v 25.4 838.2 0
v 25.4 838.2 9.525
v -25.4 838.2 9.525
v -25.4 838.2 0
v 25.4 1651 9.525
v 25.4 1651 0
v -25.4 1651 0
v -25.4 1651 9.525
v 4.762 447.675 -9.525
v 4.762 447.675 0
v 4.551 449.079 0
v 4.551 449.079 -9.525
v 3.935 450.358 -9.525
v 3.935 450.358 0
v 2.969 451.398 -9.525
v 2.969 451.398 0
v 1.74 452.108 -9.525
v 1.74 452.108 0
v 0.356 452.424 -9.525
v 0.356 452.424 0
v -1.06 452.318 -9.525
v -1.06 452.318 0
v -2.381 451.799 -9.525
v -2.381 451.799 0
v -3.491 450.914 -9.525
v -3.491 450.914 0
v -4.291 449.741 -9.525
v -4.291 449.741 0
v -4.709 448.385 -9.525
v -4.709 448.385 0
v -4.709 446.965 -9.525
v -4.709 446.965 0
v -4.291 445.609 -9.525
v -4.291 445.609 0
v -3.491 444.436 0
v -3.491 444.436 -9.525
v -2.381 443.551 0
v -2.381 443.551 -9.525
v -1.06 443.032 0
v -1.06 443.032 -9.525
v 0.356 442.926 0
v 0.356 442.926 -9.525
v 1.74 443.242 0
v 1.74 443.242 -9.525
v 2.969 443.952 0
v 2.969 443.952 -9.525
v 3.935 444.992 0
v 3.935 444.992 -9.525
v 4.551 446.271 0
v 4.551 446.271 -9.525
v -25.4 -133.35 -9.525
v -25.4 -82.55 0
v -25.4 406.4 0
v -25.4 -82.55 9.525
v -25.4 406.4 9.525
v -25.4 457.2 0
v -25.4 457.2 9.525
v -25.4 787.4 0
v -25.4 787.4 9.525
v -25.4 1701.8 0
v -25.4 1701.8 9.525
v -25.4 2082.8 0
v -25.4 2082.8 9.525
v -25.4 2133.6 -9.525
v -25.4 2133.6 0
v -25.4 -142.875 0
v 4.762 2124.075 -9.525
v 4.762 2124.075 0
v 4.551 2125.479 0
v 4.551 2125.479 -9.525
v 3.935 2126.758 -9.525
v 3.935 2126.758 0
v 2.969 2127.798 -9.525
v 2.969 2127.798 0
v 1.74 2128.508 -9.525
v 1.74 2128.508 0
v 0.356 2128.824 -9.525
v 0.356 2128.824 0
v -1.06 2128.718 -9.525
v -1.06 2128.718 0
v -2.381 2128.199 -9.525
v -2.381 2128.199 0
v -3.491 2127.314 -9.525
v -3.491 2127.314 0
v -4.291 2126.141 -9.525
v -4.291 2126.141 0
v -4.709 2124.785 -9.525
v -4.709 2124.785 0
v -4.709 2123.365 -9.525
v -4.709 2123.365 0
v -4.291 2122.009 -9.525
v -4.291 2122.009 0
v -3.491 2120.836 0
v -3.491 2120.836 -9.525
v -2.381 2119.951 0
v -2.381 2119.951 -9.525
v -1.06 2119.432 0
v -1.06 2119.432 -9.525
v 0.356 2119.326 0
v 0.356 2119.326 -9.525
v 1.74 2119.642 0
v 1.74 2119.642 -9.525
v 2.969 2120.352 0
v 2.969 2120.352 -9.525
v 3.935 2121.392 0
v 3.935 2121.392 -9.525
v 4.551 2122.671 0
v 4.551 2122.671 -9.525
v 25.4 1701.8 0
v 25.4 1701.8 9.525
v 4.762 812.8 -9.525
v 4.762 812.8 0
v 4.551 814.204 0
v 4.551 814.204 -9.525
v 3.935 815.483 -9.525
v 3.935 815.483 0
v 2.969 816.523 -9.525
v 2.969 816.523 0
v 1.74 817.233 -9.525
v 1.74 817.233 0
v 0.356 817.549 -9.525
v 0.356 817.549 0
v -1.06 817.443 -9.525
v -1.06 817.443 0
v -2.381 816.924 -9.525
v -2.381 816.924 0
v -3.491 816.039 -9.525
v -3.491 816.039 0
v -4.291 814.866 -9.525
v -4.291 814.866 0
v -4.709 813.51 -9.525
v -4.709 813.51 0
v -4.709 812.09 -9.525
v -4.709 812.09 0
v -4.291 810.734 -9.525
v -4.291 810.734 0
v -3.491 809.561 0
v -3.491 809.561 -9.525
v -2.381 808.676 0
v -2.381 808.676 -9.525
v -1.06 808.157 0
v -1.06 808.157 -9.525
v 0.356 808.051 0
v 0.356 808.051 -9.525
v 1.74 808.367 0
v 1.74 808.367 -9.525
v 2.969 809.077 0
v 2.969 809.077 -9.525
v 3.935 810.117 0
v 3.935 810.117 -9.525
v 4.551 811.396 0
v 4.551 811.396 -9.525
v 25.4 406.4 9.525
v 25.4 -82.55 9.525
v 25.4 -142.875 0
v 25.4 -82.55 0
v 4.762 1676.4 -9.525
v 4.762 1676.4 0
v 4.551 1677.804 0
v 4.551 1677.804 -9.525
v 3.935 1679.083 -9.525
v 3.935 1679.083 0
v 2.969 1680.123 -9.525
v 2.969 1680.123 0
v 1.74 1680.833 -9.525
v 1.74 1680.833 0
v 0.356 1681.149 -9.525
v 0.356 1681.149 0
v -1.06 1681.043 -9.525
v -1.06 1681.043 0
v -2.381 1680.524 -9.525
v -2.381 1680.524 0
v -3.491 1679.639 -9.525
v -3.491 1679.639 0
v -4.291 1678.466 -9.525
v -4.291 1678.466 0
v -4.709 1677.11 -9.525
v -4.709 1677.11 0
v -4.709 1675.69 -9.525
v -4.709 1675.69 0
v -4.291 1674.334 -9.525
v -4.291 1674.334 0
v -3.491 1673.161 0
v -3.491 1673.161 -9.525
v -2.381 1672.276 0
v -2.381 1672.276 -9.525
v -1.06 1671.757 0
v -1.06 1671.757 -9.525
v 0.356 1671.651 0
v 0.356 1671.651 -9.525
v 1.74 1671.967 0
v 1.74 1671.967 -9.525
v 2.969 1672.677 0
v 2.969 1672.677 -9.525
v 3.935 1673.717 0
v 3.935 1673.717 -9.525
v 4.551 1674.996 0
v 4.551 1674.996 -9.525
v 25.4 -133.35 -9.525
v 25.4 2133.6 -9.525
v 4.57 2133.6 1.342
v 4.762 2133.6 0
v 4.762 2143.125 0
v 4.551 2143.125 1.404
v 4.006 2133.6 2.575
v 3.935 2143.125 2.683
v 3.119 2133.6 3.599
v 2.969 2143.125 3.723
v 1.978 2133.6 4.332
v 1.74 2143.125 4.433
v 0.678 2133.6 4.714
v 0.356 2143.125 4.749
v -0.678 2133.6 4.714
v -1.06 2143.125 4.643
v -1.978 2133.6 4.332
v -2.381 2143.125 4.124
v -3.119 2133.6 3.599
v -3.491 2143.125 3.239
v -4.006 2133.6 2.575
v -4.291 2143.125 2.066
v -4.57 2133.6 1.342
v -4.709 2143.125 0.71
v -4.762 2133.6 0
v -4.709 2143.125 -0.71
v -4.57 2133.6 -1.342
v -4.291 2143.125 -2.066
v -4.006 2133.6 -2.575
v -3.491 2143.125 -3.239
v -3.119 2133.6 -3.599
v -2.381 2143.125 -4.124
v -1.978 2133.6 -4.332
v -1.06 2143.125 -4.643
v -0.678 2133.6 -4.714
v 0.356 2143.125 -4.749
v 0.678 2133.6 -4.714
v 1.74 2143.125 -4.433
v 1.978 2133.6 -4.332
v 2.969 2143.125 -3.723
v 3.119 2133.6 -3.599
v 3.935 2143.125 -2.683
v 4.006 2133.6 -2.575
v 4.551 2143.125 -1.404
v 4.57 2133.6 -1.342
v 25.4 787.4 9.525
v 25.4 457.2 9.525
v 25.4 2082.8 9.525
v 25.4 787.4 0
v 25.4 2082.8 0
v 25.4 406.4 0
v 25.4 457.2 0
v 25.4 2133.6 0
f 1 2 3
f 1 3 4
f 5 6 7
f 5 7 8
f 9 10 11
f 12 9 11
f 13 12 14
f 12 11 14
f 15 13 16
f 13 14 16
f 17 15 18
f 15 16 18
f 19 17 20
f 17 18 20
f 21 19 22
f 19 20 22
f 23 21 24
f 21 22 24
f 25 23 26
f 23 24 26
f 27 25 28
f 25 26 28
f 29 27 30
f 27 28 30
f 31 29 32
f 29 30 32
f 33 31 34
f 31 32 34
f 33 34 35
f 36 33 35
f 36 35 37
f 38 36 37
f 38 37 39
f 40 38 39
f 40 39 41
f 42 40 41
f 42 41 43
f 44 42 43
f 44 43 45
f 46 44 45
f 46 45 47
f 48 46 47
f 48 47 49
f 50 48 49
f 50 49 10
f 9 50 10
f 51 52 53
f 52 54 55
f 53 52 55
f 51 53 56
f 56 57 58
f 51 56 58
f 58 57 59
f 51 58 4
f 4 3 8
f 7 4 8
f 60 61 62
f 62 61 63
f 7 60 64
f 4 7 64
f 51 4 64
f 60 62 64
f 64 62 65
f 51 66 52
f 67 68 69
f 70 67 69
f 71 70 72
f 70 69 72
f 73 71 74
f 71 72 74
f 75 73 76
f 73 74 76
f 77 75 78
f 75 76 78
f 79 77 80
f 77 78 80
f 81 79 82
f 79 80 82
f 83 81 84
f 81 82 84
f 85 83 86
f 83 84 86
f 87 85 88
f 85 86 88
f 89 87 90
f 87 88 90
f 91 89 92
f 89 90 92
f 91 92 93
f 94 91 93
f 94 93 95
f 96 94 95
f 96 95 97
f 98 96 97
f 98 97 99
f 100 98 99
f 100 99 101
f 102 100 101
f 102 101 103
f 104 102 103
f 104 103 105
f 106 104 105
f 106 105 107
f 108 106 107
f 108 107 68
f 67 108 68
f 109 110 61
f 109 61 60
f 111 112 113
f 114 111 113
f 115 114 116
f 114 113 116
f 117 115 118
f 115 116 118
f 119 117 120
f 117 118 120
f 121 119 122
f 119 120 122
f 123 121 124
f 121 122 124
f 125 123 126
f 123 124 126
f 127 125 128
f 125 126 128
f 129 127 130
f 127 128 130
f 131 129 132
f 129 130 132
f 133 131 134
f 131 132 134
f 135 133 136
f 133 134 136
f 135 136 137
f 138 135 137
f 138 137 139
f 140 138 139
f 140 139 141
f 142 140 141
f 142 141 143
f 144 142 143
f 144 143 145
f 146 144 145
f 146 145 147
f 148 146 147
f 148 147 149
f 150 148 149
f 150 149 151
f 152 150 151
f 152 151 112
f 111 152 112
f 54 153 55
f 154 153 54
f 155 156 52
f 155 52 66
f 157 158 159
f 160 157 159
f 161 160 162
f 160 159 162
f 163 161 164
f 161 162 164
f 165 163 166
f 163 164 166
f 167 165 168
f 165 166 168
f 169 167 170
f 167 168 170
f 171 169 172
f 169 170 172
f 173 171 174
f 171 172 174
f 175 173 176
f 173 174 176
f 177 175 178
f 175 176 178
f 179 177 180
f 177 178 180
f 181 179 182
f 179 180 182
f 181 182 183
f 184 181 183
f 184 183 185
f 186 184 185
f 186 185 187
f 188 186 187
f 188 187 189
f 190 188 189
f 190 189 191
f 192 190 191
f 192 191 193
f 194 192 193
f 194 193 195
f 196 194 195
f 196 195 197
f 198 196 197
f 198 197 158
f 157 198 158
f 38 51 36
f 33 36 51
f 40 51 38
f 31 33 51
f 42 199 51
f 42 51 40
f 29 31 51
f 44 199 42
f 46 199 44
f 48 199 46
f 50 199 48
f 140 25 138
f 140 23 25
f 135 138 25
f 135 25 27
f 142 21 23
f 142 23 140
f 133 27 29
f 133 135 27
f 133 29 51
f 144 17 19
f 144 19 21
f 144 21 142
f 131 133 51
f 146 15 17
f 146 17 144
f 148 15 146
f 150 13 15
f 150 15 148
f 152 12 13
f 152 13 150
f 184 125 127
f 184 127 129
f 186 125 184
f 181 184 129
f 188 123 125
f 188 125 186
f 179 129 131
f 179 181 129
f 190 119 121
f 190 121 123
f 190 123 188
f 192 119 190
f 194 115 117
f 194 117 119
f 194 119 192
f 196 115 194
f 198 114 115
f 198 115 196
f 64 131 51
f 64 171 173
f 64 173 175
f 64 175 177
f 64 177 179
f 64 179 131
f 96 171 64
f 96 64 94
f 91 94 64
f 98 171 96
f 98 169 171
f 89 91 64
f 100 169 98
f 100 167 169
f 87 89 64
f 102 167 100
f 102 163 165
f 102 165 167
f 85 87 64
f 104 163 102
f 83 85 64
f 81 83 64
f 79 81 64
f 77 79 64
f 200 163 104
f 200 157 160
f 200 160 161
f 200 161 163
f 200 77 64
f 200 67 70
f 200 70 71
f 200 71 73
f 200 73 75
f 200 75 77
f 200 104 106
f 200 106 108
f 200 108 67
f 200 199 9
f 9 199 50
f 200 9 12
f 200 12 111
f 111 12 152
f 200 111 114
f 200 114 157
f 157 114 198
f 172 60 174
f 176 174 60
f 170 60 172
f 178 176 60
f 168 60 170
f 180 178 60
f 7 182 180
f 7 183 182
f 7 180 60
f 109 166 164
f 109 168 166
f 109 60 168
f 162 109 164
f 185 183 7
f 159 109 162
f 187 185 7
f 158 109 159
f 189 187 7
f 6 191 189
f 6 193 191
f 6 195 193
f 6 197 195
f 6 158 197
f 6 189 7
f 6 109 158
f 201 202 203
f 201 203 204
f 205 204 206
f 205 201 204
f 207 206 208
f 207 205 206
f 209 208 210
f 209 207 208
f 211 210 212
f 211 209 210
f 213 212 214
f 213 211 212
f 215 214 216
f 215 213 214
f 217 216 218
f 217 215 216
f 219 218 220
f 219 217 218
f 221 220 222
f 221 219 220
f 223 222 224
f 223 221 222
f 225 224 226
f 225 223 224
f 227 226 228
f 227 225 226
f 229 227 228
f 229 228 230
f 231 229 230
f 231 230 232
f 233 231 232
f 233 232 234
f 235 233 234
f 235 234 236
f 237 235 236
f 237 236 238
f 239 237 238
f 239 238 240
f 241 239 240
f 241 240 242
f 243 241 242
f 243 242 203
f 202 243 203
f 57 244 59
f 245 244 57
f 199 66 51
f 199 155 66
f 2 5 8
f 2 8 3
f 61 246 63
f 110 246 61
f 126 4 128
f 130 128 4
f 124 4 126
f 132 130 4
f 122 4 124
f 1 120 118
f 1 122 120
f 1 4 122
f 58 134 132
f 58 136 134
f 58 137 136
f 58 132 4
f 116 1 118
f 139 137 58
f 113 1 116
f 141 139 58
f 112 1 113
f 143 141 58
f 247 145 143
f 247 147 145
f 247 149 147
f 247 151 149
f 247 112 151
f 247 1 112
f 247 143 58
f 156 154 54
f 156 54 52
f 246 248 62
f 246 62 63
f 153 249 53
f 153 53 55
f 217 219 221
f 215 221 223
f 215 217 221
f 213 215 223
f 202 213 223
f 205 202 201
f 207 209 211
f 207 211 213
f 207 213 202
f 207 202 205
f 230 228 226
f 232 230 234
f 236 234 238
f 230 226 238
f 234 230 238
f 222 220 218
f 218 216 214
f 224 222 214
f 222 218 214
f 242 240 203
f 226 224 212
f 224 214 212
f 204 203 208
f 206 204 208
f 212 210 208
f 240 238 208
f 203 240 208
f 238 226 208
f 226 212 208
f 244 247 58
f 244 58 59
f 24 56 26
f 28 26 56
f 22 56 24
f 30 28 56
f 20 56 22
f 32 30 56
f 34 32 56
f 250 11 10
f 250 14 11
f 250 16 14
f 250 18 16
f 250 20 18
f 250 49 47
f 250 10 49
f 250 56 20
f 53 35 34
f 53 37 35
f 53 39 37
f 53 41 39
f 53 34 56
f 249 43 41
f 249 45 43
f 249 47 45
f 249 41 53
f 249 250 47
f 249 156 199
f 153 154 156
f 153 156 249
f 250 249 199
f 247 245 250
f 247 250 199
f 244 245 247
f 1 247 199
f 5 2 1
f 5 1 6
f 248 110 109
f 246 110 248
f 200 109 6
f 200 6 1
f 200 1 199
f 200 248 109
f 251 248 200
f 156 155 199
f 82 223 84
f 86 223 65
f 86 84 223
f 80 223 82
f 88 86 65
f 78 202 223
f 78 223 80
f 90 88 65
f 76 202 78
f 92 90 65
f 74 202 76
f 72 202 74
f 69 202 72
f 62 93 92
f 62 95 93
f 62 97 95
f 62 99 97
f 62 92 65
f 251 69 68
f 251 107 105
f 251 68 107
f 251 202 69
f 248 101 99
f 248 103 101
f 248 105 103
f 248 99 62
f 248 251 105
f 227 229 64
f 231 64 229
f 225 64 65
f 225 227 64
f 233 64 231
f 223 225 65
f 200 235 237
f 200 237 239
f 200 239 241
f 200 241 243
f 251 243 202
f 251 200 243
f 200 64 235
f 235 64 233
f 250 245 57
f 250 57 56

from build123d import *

# Parameters (mm, degrees)
F1_DEPTH = 25.4
F3_R     = 4.7625
F4_DEPTH = 9.525
F5_R     = 4.7625
F6_DEPTH = 25.4


with BuildPart() as f1:
    # F0 (on Right) → F1 (new body, symmetric)
    with BuildSketch(Plane.YZ):
        Polygon((-33.290768, -9.525), (2133.6, -9.525), (2133.6, 0), (2082.8, 0), (2082.8, 9.525), (1701.8, 9.525), (1701.8, 0), (1651, 0), (1651, 9.525), (838.2, 9.525), (838.2, 0), (787.4, 0), (787.4, 9.525), (457.2, 9.525), (457.2, 0), (406.4, 0), (406.4, 9.525), (0, 9.525), (-82.55, 9.525), (-82.55, 0), (-142.875, 0), (-133.35, -9.525), align=None)
    extrude(amount=F1_DEPTH, both=True)

    # F3 (on offset) → F4 (join)
    with BuildSketch(Plane.XZ.offset(-2133.6)):
        Circle(F3_R)
    extrude(amount=-F4_DEPTH)

    # F5 (on Top) → F6 (cut)
    with BuildSketch(Plane.XY):
        with Locations((0, 447.675)):
            Circle(F5_R)
        with Locations((0, 812.8)):
            Circle(F5_R)
        with Locations((0, 1676.4)):
            Circle(F5_R)
        with Locations((0, 2124.075)):
            Circle(F5_R)
    extrude(amount=-F6_DEPTH, mode=Mode.SUBTRACT)


solid = f1.part
